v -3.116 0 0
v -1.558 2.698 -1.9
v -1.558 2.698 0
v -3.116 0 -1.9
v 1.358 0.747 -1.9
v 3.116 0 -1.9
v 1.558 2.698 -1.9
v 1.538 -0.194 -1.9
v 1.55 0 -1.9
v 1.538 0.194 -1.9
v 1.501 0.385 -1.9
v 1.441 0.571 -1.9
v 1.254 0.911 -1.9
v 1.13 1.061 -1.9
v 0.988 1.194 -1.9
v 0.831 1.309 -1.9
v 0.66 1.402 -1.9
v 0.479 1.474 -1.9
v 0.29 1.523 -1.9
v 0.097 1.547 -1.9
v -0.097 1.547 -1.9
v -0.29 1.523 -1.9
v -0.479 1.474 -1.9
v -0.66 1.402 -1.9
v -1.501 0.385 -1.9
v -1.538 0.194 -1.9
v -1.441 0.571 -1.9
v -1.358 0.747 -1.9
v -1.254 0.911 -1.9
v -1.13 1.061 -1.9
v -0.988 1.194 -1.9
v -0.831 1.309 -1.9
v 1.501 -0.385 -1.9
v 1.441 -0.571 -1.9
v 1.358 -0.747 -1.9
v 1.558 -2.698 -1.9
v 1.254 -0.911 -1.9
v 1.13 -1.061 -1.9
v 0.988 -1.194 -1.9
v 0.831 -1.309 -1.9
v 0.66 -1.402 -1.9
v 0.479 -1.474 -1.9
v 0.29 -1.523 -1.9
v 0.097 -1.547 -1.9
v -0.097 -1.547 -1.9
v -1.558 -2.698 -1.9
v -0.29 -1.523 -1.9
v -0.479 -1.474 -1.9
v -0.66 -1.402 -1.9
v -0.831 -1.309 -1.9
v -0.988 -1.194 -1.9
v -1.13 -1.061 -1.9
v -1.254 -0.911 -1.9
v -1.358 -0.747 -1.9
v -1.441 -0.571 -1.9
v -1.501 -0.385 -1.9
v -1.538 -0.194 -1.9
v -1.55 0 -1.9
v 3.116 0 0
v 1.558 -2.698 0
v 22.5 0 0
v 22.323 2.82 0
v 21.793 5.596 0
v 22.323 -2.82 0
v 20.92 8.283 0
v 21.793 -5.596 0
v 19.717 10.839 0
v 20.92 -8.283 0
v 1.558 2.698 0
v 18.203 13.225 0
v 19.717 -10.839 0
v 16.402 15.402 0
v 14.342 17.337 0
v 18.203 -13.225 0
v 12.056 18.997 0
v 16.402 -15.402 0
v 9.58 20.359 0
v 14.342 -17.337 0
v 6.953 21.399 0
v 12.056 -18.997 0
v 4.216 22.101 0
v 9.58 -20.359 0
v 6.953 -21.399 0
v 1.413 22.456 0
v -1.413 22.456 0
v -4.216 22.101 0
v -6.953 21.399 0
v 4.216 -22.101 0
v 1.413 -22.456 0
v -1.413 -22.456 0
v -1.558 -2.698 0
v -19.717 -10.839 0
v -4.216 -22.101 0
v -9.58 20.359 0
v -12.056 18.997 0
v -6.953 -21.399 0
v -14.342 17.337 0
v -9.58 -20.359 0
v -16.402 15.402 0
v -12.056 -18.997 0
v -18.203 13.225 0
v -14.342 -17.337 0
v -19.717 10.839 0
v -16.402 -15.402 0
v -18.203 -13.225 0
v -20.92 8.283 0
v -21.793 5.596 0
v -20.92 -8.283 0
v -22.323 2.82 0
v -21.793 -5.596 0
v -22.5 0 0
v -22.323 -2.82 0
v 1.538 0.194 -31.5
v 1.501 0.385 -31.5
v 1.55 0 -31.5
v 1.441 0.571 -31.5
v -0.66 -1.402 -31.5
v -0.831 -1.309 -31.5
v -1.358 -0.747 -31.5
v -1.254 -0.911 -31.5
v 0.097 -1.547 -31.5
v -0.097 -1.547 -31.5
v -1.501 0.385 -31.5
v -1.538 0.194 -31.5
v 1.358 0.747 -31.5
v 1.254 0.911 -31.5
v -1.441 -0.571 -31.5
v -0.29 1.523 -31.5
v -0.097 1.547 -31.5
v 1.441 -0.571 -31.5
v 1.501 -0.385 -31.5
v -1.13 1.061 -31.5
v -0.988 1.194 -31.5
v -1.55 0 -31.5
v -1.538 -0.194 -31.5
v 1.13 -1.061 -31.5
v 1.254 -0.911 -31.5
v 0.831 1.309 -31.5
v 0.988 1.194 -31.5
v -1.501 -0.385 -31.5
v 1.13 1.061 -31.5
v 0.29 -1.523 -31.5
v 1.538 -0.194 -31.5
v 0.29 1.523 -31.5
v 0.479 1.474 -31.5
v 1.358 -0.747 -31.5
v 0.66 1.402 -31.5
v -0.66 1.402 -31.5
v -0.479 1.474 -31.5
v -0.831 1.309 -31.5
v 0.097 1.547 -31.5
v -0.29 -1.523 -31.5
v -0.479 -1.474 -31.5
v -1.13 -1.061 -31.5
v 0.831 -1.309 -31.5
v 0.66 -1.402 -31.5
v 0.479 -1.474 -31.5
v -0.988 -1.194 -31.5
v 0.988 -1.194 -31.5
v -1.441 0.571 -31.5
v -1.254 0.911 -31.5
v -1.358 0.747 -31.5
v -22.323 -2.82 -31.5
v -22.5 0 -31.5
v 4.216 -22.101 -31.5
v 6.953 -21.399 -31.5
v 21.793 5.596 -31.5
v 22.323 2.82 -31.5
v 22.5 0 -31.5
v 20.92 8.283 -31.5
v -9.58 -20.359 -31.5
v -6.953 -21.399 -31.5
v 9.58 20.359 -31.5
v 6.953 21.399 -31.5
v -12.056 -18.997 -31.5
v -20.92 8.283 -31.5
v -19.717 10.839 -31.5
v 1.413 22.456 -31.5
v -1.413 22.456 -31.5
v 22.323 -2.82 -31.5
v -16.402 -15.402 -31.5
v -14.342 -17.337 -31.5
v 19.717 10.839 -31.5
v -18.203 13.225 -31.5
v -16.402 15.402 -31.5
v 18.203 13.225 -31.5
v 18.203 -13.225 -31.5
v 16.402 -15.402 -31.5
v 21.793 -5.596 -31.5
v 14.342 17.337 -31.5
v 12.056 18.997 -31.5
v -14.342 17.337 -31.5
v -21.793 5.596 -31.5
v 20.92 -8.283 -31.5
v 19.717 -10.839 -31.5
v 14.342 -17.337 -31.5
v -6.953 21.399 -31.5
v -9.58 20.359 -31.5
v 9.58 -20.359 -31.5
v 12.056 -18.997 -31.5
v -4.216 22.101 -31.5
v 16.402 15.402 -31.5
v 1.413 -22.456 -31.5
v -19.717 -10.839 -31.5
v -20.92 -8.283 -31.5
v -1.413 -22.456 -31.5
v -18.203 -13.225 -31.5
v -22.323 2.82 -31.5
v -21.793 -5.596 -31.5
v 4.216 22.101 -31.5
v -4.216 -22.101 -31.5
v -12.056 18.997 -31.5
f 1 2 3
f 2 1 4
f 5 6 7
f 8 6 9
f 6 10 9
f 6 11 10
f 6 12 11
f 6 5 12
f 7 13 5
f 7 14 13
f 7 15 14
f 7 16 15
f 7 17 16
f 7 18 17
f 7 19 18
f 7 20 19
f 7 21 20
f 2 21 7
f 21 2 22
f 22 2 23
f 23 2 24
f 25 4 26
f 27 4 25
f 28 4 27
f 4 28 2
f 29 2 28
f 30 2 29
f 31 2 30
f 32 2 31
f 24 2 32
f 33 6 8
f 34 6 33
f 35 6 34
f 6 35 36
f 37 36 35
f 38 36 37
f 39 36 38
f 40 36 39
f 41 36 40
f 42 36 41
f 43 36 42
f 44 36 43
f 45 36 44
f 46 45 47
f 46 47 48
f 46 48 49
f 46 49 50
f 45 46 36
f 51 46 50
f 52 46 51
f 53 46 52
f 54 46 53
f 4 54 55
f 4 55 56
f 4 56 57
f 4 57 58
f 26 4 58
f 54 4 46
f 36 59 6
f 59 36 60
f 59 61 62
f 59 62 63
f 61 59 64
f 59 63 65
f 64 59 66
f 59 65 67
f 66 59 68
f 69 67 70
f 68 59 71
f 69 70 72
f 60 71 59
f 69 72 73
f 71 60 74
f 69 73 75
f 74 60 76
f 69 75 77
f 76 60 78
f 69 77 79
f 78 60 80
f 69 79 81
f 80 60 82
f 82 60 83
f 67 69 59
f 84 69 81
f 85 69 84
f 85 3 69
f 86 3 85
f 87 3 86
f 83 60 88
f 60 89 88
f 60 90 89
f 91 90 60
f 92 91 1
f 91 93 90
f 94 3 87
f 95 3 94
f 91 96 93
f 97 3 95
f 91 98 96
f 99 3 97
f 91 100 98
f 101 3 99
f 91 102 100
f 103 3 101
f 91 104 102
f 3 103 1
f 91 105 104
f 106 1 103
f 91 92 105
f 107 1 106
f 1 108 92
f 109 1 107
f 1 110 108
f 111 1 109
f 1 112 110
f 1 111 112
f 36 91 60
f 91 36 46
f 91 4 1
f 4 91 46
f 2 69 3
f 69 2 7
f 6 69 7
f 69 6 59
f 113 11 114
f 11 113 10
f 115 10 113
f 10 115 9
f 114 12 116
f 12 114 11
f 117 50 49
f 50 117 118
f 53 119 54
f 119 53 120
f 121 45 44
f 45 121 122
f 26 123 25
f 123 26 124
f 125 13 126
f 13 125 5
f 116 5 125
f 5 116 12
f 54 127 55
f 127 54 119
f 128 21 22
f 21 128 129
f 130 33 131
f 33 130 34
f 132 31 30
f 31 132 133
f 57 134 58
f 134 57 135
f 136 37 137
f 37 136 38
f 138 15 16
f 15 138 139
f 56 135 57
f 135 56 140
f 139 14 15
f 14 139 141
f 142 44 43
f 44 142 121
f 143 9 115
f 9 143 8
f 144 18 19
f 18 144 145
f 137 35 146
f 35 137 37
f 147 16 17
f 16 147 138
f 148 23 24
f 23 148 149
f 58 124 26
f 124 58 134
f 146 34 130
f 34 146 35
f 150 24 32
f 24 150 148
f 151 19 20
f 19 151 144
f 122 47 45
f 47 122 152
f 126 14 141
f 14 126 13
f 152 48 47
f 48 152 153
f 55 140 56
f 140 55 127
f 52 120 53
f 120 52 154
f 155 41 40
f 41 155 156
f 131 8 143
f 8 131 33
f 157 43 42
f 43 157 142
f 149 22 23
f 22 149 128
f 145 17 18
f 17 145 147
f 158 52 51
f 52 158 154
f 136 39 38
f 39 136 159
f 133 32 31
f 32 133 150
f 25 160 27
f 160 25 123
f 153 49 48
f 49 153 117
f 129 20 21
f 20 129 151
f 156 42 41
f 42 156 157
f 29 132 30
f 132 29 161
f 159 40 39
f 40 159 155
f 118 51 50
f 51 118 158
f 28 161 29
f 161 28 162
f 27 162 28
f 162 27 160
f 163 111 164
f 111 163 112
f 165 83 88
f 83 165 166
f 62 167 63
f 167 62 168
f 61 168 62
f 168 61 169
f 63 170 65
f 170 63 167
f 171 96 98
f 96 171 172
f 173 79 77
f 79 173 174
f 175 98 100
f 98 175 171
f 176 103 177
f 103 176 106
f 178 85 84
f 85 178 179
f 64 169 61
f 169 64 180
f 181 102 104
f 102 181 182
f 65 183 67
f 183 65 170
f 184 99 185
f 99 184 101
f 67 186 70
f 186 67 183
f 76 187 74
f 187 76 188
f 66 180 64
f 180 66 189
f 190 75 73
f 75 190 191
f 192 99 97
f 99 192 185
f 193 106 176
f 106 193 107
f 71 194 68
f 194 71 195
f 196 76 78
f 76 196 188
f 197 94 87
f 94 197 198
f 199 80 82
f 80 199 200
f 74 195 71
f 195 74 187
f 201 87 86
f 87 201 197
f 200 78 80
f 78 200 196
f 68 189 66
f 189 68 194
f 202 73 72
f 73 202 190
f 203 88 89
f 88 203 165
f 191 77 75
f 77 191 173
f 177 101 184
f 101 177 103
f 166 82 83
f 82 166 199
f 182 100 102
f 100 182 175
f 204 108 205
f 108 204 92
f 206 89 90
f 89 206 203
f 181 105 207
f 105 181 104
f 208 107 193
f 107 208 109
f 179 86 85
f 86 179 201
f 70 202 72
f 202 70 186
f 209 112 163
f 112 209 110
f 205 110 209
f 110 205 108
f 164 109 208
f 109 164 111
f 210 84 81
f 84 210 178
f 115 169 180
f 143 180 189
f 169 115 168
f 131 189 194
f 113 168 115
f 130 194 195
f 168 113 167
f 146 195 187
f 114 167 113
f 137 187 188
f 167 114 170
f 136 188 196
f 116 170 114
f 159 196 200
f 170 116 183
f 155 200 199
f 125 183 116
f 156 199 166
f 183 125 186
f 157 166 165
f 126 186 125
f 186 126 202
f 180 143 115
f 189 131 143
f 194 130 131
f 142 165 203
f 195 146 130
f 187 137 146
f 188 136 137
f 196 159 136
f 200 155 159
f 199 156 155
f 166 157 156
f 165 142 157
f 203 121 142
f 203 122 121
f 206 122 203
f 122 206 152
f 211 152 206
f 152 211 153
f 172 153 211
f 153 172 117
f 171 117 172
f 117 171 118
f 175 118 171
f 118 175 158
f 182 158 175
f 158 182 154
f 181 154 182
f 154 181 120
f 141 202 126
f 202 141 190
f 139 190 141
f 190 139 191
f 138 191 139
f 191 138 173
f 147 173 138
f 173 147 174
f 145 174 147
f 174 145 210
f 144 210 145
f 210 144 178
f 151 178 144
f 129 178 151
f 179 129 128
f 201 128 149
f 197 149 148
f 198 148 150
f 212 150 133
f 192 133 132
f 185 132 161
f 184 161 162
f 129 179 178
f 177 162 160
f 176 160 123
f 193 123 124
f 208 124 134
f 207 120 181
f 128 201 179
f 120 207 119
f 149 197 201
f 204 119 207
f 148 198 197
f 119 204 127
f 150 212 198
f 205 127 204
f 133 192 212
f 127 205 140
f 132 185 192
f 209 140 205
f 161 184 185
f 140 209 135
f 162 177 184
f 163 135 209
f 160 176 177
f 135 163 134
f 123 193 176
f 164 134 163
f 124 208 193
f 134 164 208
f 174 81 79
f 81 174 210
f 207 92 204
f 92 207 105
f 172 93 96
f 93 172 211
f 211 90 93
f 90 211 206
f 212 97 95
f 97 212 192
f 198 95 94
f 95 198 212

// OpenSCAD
$fn = 50;


difference() {
	union() {
		translate(v = [0, 0, -31.5000000000]) {
			cylinder(h = 31.5000000000, r = 22.5000000000);
		}
	}
	union() {
		translate(v = [0, 0, 0]) {
			rotate(a = [0, 0, 0]) {
				difference() {
					union() {
						translate(v = [0, 0, -1.9000000000]) {
							linear_extrude(height = 1.9000000000) {
								polygon(points = [[3.1158000000, 0.0000000000], [1.5579000000, 2.6983619531], [-1.5579000000, 2.6983619531], [-3.1158000000, 0.0000000000], [-1.5579000000, -2.6983619531], [1.5579000000, -2.6983619531]]);
							}
						}
					}
					union();
				}
			}
		}
		#translate(v = [0, 0, -100.0000000000]) {
			cylinder(h = 200, r = 1.5500000000);
		}
	}
}
